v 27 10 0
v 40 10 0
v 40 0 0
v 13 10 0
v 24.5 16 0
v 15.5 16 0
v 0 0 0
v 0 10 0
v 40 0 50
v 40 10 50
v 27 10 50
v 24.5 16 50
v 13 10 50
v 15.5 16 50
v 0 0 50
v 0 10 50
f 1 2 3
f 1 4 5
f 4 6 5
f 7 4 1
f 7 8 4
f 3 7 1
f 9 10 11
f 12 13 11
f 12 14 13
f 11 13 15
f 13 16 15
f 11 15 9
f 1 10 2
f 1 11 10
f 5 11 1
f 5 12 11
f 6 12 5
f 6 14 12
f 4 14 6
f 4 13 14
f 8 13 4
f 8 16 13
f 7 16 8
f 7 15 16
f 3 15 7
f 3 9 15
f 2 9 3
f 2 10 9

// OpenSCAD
$fn = 32;

// ----------------------------------------------------------------------
// V guide rail: dovetail, 40 mm wide
// ----------------------------------------------------------------------

// --- parameters (mm) ---
rail_w = 40;              // rail width, X
base_t = 10;              // base plate thickness
v_depth = 6;              // V feature depth / height
v_half_w = 7;             // half width of the V at the base face
plate_t = 50;             // rail length, Z (the extrusion height)
top_half_w = 4.5;         // half width at the dovetail top

dovetail_base = 2 * v_half_w;  // dovetail width at the base
dovetail_top = 2 * top_half_w;  // dovetail width at the top

profile = [[0, 0], [40, 0], [40, 10], [27, 10], [24.5, 16], [15.5, 16], [13, 10], [0, 10]];  // primary outline, 8 points, counter clockwise

// --- the one profile operation ---
linear_extrude(height = plate_t) polygon(points = profile);
